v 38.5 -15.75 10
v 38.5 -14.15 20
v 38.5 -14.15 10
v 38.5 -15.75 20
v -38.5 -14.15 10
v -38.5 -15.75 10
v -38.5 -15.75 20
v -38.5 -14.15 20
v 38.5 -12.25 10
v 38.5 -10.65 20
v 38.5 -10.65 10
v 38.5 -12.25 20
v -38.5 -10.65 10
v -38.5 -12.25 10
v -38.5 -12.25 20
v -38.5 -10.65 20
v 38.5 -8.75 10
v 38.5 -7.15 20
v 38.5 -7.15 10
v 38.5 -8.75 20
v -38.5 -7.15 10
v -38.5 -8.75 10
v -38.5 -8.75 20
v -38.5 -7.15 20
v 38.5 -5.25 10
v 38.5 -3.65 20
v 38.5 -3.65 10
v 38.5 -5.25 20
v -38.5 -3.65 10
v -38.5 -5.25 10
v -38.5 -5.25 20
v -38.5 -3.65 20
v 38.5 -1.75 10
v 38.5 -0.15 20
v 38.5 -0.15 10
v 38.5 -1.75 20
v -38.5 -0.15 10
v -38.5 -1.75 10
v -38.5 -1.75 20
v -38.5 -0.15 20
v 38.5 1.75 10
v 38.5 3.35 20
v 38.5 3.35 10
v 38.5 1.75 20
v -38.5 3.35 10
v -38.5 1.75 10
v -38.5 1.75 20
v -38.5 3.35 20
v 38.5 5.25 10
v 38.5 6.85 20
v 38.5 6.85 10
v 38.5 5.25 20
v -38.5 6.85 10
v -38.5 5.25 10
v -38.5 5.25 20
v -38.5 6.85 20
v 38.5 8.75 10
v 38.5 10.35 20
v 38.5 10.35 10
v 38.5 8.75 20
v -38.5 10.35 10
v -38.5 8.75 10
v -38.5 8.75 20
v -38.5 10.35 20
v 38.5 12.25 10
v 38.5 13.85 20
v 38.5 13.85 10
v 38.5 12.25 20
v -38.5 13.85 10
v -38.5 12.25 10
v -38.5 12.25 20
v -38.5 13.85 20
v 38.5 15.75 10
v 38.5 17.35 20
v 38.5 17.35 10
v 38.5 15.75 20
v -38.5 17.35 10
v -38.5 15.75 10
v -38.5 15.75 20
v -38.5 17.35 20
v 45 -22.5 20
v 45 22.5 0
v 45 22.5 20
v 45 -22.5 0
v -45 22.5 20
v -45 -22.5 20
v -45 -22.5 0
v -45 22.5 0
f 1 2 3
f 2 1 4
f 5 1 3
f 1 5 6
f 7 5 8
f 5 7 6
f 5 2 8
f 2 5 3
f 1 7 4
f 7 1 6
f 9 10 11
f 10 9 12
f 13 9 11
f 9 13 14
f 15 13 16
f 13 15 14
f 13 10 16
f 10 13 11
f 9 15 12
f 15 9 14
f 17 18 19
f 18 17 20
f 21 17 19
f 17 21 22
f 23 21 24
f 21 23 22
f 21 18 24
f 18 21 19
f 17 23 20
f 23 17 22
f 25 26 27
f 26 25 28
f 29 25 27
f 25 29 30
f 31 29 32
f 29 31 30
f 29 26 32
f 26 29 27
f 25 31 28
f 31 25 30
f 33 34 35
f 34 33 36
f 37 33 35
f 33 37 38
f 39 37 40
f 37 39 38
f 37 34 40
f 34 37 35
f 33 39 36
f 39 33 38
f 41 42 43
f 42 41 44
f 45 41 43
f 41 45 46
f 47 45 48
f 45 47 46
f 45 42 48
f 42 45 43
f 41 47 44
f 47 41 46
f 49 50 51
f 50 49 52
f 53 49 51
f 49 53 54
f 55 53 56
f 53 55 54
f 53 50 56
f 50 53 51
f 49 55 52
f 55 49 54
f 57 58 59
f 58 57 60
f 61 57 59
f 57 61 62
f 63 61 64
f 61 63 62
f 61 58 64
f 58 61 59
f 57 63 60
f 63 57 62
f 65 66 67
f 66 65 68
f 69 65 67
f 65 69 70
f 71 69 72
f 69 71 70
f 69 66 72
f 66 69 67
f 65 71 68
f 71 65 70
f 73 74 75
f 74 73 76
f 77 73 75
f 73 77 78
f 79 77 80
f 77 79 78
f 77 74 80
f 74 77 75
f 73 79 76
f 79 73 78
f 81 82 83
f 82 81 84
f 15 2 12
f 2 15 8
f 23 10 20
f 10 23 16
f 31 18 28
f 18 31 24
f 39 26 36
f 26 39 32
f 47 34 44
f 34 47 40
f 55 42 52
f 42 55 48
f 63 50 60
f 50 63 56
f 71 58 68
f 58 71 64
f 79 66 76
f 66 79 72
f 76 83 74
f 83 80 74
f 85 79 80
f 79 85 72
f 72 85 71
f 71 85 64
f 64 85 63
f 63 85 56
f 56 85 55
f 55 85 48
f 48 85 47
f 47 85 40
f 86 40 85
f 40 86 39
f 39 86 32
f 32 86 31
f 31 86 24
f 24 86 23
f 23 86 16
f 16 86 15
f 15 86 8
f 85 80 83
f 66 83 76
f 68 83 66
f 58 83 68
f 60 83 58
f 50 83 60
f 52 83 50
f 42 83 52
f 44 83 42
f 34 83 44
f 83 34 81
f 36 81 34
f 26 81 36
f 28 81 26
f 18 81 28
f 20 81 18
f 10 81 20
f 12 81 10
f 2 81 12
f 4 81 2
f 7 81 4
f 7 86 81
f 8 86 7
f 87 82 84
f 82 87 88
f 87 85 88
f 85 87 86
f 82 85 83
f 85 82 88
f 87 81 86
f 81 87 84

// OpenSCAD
// Slide drying rack
// Print orientation: base block on XY plane, slots open upward (+Z)

// ---------- Parameters ----------
block_len   = 90;    // block length along X (mm)
block_wid   = 45;    // block width along Y (mm)
block_h     = 20;    // block height along Z (mm)

slot_count  = 10;    // number of slide slots
slot_len    = 77;    // slot length along X (mm)
slot_w      = 1.6;   // slot width along Y (mm)
slot_depth  = 10;    // slot depth from top face (mm)
slot_pitch  = 3.5;   // centre-to-centre slot spacing in Y (mm)

eps         = 0.5;   // overshoot for clean boolean cuts (mm)

$fn = 64;

// ---------- Derived ----------
slot_x0 = -slot_len / 2;                      // first slot start X
slot_y0 = -(slot_count - 1) * slot_pitch / 2; // first slot centre Y

// ---------- Model ----------
difference() {
    // Base block, centred in X/Y, resting on z = 0
    translate([-block_len / 2, -block_wid / 2, 0])
        cube([block_len, block_wid, block_h]);

    // Parallel slots running along X, open at the top
    for (i = [0 : slot_count - 1])
        translate([slot_x0, slot_y0 + i * slot_pitch, block_h - slot_depth])
            cube([slot_len, slot_w, slot_depth + eps]);
}
